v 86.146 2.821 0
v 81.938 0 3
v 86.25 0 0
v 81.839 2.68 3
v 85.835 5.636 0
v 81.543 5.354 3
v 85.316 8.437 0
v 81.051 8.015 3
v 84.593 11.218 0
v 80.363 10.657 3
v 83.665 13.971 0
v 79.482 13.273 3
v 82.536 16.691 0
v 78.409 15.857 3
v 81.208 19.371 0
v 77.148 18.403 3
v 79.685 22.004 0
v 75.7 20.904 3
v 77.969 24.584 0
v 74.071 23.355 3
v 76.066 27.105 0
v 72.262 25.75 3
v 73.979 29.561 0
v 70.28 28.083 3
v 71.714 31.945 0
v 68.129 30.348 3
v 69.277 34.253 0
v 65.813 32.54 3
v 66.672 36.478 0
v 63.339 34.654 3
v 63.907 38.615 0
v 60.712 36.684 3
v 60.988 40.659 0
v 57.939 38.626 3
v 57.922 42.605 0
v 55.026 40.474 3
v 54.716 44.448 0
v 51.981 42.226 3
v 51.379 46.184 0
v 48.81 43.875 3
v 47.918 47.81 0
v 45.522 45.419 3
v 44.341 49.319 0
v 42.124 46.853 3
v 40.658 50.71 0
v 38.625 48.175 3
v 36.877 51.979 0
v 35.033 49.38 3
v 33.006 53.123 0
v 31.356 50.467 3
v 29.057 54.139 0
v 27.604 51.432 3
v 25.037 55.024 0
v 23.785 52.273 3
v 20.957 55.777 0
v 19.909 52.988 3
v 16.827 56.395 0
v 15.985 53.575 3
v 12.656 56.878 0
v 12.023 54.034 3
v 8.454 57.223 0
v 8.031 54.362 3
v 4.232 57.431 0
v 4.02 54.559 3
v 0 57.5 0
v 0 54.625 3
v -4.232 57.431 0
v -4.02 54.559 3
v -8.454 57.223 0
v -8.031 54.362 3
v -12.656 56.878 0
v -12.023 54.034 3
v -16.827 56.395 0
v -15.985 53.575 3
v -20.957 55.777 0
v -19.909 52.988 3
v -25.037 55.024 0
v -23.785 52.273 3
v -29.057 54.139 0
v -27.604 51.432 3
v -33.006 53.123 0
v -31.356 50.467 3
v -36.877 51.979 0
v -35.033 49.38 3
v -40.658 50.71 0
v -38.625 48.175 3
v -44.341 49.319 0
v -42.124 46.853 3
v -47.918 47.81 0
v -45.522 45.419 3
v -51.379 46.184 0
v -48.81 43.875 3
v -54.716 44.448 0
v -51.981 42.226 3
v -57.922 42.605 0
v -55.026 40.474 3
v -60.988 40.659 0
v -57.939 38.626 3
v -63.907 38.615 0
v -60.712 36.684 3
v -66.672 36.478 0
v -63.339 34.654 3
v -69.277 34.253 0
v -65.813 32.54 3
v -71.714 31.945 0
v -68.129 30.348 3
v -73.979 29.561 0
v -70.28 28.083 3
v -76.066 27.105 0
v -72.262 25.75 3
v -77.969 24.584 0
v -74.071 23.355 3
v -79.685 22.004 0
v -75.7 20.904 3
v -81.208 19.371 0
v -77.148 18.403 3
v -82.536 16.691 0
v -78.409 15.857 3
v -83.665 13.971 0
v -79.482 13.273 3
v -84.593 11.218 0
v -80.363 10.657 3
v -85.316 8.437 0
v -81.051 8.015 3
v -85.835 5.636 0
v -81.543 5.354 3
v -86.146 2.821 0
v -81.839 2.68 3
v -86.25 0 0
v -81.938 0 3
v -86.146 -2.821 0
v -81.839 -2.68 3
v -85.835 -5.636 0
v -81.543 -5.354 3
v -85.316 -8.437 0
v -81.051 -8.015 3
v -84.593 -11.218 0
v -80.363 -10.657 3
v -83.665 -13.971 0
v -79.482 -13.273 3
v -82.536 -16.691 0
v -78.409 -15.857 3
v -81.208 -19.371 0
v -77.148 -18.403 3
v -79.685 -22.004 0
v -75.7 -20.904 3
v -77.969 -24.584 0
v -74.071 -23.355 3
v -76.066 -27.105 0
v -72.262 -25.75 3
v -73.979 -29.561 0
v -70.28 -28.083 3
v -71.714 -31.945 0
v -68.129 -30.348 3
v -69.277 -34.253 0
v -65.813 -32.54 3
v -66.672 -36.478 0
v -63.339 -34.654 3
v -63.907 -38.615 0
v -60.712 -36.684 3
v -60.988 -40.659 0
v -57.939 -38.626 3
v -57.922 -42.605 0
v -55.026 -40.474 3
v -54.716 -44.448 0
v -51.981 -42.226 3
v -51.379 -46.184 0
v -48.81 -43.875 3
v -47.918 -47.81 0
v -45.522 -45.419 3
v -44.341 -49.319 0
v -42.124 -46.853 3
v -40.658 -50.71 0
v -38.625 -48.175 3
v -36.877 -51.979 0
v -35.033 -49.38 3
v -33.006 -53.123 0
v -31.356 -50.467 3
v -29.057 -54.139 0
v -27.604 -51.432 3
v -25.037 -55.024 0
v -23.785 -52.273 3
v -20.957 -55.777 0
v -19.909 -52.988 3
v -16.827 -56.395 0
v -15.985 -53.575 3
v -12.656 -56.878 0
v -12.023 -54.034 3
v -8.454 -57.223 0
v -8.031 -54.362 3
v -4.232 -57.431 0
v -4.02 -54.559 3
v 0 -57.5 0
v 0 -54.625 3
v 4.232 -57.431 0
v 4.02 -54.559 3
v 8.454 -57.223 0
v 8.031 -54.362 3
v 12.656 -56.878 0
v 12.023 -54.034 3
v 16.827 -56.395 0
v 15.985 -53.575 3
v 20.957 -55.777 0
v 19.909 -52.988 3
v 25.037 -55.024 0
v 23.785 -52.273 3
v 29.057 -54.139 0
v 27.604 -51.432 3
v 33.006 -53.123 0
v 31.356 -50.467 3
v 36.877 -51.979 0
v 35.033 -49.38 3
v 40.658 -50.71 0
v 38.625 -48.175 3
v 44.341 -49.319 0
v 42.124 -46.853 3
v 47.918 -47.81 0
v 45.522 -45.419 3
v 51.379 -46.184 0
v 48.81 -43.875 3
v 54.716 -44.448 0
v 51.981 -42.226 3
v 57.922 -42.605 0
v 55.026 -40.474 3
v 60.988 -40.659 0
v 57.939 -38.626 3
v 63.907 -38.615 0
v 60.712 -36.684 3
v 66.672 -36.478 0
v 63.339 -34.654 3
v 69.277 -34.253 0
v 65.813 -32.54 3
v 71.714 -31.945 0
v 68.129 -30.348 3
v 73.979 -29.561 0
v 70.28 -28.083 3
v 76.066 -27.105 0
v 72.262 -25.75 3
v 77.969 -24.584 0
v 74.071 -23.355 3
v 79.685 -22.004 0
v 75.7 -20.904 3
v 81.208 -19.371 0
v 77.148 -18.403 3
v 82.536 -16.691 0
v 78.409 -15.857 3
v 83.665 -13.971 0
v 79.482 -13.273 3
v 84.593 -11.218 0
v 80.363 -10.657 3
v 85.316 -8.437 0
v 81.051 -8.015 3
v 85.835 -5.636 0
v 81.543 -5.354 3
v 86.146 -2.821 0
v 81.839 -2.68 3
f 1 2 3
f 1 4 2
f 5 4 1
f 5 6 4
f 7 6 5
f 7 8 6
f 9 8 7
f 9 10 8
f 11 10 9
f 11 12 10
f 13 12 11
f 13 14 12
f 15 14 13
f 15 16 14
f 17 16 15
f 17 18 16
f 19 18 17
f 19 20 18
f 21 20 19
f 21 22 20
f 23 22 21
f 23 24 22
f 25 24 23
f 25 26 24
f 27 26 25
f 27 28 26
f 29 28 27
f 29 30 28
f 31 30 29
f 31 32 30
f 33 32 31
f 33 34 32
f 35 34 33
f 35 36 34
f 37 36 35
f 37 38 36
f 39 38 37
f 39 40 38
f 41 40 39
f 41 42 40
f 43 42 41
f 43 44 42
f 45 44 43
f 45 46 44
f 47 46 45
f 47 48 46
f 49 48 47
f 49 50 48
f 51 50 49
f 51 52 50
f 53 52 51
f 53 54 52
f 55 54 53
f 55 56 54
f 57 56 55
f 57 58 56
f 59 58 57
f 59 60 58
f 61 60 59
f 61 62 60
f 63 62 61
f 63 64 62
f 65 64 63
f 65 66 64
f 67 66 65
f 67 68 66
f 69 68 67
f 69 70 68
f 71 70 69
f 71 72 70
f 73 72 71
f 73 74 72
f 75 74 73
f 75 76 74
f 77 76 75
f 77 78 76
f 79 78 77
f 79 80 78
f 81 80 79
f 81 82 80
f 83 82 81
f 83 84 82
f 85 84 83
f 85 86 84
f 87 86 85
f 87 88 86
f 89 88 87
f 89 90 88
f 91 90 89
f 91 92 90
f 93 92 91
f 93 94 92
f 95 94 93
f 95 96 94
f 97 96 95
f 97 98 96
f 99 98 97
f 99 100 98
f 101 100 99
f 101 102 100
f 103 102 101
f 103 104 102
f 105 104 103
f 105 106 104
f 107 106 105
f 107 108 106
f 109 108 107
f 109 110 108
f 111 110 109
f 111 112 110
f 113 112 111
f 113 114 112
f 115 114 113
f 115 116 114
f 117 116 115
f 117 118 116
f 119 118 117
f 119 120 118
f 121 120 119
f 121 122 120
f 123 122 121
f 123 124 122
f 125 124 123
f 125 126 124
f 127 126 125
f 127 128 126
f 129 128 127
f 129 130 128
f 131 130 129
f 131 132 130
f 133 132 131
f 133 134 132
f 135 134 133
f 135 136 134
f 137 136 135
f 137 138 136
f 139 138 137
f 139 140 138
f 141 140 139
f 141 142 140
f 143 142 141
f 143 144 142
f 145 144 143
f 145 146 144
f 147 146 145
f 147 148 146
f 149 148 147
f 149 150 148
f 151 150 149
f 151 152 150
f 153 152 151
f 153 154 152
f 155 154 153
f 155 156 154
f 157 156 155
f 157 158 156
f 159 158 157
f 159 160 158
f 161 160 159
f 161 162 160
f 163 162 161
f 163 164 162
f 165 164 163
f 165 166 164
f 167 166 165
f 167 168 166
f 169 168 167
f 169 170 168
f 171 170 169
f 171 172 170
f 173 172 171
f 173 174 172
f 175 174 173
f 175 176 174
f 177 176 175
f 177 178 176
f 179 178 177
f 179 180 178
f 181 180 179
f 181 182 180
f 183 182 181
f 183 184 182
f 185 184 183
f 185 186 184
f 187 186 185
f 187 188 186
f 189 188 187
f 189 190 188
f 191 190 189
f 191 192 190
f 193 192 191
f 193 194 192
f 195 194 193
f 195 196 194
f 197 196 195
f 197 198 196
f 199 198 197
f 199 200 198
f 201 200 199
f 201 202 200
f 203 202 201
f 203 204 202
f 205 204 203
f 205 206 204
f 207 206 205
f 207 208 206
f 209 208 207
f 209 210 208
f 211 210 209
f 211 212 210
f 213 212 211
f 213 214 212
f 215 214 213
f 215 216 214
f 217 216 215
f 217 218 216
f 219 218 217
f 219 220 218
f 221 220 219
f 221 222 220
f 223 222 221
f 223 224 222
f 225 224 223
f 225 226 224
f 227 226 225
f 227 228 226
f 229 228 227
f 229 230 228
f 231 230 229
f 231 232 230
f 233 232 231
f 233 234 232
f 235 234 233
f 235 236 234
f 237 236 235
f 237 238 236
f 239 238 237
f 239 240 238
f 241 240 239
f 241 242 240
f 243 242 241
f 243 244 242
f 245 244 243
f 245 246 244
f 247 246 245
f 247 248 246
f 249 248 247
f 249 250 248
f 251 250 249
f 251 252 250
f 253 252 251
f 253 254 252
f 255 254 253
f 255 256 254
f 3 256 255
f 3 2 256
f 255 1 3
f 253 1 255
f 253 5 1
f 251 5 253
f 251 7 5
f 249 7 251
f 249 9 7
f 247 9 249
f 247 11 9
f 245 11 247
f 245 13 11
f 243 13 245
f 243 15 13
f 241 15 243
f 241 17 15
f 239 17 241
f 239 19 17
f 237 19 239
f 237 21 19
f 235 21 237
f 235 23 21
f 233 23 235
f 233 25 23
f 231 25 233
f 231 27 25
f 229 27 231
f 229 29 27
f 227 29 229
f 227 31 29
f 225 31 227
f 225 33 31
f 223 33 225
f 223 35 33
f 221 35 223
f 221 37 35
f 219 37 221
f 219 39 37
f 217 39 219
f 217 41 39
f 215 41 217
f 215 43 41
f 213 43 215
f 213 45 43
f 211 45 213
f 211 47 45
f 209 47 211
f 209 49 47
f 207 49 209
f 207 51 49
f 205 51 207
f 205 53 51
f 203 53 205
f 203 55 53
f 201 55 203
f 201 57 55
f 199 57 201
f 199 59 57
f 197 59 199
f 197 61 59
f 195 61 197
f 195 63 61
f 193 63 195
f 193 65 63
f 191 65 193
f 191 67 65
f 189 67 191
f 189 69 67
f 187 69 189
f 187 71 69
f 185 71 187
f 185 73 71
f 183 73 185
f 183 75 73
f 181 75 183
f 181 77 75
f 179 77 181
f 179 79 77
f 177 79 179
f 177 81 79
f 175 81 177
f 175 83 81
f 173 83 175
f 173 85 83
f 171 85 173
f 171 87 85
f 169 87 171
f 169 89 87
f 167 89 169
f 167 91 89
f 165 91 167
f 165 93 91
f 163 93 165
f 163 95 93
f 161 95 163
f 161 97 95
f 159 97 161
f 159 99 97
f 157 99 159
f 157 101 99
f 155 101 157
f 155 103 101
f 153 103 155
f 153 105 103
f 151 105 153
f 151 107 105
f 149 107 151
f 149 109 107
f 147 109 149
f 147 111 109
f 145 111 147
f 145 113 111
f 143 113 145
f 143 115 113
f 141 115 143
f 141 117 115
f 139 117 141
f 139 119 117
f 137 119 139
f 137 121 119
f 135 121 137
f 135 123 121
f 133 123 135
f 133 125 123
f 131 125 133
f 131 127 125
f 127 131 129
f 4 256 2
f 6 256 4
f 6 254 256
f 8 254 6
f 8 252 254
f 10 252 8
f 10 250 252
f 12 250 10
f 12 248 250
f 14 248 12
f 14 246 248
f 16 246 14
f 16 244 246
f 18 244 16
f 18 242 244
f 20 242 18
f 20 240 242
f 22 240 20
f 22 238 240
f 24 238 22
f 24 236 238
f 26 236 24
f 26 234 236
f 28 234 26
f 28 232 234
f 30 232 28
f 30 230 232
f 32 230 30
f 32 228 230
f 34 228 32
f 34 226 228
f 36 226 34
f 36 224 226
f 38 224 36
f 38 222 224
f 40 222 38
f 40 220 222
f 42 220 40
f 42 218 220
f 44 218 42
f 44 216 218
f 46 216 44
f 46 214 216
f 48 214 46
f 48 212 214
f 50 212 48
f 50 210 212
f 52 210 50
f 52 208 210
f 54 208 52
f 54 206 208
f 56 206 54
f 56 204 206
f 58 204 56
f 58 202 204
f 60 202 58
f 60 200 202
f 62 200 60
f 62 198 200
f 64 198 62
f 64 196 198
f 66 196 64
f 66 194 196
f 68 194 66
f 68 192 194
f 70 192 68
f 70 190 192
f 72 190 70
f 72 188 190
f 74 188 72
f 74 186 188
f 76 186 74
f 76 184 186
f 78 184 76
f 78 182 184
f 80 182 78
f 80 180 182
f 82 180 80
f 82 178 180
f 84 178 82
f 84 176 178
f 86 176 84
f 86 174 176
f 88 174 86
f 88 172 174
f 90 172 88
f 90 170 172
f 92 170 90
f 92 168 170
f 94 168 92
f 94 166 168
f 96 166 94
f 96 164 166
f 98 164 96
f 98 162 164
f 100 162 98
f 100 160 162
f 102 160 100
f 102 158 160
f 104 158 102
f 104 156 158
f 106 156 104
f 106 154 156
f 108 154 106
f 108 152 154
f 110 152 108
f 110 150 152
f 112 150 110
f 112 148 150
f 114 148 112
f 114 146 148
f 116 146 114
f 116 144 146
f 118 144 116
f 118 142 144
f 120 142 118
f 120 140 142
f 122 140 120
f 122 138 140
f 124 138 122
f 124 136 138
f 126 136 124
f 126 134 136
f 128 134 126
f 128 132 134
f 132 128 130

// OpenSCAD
d=115;

scale([1.5,1,1]) {
    cylinder(d1=d, d2=d*.95, h=3, $fn=128);
}
